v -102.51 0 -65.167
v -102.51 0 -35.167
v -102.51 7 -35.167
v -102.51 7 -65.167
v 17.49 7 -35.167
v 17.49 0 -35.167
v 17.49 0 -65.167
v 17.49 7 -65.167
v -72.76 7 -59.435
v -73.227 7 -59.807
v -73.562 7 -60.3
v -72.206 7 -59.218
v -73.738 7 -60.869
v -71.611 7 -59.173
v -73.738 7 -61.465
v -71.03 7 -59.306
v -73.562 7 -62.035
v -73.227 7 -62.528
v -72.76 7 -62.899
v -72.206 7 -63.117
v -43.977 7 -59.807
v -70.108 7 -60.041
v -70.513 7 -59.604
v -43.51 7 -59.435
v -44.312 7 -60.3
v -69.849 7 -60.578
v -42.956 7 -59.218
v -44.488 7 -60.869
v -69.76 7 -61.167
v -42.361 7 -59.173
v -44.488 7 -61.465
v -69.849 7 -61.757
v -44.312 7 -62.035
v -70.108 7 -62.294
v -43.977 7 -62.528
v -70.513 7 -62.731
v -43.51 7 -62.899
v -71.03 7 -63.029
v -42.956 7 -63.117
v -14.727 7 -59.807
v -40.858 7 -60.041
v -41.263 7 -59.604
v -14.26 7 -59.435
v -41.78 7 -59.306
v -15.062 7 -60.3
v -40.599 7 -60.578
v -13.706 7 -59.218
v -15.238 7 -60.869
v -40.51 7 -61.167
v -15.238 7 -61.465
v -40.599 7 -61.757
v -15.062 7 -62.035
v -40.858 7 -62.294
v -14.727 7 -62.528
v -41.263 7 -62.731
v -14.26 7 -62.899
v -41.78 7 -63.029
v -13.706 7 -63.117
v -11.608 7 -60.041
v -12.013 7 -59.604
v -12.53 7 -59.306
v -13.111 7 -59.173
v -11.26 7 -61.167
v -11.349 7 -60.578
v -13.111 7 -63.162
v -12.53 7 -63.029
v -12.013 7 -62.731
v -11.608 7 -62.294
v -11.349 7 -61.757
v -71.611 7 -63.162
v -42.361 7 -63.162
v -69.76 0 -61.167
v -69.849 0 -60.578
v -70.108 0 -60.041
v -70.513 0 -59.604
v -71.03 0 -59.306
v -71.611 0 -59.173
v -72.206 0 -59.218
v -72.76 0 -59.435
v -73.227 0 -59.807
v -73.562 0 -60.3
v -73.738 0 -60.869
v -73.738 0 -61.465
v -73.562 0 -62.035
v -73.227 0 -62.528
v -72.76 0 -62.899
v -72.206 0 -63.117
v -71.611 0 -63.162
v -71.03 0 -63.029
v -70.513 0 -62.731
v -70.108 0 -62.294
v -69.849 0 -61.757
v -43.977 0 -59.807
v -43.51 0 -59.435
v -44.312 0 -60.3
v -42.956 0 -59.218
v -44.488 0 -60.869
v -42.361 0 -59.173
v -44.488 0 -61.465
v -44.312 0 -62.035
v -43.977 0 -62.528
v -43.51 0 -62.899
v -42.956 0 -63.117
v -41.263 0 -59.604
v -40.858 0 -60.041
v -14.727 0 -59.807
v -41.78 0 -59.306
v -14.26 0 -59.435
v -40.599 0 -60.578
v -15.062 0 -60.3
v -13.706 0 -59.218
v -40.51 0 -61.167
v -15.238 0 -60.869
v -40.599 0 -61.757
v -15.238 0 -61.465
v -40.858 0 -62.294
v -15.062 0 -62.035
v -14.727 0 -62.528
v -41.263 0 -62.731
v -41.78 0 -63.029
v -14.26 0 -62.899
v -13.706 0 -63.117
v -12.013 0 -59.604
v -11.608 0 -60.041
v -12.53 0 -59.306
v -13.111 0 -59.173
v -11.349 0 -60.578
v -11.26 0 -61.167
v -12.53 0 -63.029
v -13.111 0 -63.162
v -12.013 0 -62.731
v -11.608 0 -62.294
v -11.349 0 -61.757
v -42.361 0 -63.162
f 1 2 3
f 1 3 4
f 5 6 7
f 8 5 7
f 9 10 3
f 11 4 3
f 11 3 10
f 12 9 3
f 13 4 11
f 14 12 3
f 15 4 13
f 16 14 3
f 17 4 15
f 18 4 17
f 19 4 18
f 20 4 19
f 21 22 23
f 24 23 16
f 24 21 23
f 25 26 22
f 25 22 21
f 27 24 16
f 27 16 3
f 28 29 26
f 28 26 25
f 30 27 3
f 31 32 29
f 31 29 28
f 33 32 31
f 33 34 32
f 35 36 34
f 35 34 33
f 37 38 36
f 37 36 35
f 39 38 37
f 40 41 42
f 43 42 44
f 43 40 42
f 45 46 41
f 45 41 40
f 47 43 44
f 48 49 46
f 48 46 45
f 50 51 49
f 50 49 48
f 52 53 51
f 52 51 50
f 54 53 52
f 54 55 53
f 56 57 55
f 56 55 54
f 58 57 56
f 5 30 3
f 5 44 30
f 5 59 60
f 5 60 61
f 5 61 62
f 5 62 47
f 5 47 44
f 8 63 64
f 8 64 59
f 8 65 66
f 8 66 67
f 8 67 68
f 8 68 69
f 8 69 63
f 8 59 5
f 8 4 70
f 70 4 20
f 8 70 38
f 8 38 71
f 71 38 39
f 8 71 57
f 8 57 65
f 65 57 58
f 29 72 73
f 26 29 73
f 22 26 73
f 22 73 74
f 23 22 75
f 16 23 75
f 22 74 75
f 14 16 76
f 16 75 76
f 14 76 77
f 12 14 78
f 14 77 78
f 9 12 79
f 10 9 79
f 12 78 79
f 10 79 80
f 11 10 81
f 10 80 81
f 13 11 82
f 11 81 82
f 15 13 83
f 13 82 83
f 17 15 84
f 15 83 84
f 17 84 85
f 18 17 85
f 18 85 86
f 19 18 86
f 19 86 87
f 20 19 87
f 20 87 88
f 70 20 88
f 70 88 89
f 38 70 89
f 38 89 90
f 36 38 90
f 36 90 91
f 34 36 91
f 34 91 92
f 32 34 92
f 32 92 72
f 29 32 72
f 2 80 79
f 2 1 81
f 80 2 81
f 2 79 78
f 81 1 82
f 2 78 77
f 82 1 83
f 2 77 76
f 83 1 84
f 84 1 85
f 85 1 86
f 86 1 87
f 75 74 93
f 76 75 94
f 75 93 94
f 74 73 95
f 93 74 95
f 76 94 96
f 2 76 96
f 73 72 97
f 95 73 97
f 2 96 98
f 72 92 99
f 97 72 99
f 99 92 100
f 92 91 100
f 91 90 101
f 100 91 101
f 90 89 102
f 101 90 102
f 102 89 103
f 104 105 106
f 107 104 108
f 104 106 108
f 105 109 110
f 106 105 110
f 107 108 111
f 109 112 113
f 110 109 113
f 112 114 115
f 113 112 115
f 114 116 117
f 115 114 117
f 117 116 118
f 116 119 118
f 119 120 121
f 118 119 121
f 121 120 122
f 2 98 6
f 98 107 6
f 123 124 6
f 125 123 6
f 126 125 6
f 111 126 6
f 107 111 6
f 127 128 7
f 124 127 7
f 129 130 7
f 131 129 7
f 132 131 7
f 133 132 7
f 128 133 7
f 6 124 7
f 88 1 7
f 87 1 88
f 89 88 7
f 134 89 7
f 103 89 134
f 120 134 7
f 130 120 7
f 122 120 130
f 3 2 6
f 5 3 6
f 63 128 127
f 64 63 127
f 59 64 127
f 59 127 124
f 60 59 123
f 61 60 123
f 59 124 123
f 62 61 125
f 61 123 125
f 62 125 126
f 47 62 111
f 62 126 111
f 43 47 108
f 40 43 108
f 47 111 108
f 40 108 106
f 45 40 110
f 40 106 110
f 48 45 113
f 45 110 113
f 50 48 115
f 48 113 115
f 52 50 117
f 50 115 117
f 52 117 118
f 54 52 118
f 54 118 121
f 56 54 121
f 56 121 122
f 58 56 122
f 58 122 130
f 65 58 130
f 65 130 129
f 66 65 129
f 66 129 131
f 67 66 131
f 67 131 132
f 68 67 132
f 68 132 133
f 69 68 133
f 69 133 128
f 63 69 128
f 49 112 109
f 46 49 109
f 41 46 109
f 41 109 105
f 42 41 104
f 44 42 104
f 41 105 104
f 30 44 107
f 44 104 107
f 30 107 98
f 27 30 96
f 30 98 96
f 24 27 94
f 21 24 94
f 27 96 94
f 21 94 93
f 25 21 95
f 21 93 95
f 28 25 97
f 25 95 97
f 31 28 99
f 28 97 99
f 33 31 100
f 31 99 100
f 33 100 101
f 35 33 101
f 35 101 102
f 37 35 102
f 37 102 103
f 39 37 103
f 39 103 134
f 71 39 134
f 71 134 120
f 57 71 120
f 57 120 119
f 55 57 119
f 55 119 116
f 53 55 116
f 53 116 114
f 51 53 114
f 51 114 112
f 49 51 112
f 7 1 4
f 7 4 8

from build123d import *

# Parameters (mm, degrees)
SKETCH1_W           = 120
SKETCH1_H           = 30
BOSS_EXTRUDE1_DEPTH = 7
SKETCH2_R           = 2
CUT_EXTRUDE1_DEPTH  = 10


with BuildPart() as part:
    # Sketch1 → Boss-Extrude1 (new body)
    with BuildSketch(Plane(origin=(0, 0, 0), x_dir=(1, 0, 0), z_dir=(0, 1, 0))):
        with Locations((-42.510460251, 50.167364017)):
            Rectangle(SKETCH1_W, SKETCH1_H)
    extrude(amount=BOSS_EXTRUDE1_DEPTH)

    # Sketch2 → Cut-Extrude1 (cut)
    with BuildSketch(Plane.XZ):
        with Locations((-71.760460251, -61.167364017)):
            Circle(SKETCH2_R)
        with Locations((-42.510460251, -61.167364017)):
            Circle(SKETCH2_R)
        with Locations((-13.260460251, -61.167364017)):
            Circle(SKETCH2_R)
    extrude(amount=-CUT_EXTRUDE1_DEPTH, mode=Mode.SUBTRACT)


solid = part.part
